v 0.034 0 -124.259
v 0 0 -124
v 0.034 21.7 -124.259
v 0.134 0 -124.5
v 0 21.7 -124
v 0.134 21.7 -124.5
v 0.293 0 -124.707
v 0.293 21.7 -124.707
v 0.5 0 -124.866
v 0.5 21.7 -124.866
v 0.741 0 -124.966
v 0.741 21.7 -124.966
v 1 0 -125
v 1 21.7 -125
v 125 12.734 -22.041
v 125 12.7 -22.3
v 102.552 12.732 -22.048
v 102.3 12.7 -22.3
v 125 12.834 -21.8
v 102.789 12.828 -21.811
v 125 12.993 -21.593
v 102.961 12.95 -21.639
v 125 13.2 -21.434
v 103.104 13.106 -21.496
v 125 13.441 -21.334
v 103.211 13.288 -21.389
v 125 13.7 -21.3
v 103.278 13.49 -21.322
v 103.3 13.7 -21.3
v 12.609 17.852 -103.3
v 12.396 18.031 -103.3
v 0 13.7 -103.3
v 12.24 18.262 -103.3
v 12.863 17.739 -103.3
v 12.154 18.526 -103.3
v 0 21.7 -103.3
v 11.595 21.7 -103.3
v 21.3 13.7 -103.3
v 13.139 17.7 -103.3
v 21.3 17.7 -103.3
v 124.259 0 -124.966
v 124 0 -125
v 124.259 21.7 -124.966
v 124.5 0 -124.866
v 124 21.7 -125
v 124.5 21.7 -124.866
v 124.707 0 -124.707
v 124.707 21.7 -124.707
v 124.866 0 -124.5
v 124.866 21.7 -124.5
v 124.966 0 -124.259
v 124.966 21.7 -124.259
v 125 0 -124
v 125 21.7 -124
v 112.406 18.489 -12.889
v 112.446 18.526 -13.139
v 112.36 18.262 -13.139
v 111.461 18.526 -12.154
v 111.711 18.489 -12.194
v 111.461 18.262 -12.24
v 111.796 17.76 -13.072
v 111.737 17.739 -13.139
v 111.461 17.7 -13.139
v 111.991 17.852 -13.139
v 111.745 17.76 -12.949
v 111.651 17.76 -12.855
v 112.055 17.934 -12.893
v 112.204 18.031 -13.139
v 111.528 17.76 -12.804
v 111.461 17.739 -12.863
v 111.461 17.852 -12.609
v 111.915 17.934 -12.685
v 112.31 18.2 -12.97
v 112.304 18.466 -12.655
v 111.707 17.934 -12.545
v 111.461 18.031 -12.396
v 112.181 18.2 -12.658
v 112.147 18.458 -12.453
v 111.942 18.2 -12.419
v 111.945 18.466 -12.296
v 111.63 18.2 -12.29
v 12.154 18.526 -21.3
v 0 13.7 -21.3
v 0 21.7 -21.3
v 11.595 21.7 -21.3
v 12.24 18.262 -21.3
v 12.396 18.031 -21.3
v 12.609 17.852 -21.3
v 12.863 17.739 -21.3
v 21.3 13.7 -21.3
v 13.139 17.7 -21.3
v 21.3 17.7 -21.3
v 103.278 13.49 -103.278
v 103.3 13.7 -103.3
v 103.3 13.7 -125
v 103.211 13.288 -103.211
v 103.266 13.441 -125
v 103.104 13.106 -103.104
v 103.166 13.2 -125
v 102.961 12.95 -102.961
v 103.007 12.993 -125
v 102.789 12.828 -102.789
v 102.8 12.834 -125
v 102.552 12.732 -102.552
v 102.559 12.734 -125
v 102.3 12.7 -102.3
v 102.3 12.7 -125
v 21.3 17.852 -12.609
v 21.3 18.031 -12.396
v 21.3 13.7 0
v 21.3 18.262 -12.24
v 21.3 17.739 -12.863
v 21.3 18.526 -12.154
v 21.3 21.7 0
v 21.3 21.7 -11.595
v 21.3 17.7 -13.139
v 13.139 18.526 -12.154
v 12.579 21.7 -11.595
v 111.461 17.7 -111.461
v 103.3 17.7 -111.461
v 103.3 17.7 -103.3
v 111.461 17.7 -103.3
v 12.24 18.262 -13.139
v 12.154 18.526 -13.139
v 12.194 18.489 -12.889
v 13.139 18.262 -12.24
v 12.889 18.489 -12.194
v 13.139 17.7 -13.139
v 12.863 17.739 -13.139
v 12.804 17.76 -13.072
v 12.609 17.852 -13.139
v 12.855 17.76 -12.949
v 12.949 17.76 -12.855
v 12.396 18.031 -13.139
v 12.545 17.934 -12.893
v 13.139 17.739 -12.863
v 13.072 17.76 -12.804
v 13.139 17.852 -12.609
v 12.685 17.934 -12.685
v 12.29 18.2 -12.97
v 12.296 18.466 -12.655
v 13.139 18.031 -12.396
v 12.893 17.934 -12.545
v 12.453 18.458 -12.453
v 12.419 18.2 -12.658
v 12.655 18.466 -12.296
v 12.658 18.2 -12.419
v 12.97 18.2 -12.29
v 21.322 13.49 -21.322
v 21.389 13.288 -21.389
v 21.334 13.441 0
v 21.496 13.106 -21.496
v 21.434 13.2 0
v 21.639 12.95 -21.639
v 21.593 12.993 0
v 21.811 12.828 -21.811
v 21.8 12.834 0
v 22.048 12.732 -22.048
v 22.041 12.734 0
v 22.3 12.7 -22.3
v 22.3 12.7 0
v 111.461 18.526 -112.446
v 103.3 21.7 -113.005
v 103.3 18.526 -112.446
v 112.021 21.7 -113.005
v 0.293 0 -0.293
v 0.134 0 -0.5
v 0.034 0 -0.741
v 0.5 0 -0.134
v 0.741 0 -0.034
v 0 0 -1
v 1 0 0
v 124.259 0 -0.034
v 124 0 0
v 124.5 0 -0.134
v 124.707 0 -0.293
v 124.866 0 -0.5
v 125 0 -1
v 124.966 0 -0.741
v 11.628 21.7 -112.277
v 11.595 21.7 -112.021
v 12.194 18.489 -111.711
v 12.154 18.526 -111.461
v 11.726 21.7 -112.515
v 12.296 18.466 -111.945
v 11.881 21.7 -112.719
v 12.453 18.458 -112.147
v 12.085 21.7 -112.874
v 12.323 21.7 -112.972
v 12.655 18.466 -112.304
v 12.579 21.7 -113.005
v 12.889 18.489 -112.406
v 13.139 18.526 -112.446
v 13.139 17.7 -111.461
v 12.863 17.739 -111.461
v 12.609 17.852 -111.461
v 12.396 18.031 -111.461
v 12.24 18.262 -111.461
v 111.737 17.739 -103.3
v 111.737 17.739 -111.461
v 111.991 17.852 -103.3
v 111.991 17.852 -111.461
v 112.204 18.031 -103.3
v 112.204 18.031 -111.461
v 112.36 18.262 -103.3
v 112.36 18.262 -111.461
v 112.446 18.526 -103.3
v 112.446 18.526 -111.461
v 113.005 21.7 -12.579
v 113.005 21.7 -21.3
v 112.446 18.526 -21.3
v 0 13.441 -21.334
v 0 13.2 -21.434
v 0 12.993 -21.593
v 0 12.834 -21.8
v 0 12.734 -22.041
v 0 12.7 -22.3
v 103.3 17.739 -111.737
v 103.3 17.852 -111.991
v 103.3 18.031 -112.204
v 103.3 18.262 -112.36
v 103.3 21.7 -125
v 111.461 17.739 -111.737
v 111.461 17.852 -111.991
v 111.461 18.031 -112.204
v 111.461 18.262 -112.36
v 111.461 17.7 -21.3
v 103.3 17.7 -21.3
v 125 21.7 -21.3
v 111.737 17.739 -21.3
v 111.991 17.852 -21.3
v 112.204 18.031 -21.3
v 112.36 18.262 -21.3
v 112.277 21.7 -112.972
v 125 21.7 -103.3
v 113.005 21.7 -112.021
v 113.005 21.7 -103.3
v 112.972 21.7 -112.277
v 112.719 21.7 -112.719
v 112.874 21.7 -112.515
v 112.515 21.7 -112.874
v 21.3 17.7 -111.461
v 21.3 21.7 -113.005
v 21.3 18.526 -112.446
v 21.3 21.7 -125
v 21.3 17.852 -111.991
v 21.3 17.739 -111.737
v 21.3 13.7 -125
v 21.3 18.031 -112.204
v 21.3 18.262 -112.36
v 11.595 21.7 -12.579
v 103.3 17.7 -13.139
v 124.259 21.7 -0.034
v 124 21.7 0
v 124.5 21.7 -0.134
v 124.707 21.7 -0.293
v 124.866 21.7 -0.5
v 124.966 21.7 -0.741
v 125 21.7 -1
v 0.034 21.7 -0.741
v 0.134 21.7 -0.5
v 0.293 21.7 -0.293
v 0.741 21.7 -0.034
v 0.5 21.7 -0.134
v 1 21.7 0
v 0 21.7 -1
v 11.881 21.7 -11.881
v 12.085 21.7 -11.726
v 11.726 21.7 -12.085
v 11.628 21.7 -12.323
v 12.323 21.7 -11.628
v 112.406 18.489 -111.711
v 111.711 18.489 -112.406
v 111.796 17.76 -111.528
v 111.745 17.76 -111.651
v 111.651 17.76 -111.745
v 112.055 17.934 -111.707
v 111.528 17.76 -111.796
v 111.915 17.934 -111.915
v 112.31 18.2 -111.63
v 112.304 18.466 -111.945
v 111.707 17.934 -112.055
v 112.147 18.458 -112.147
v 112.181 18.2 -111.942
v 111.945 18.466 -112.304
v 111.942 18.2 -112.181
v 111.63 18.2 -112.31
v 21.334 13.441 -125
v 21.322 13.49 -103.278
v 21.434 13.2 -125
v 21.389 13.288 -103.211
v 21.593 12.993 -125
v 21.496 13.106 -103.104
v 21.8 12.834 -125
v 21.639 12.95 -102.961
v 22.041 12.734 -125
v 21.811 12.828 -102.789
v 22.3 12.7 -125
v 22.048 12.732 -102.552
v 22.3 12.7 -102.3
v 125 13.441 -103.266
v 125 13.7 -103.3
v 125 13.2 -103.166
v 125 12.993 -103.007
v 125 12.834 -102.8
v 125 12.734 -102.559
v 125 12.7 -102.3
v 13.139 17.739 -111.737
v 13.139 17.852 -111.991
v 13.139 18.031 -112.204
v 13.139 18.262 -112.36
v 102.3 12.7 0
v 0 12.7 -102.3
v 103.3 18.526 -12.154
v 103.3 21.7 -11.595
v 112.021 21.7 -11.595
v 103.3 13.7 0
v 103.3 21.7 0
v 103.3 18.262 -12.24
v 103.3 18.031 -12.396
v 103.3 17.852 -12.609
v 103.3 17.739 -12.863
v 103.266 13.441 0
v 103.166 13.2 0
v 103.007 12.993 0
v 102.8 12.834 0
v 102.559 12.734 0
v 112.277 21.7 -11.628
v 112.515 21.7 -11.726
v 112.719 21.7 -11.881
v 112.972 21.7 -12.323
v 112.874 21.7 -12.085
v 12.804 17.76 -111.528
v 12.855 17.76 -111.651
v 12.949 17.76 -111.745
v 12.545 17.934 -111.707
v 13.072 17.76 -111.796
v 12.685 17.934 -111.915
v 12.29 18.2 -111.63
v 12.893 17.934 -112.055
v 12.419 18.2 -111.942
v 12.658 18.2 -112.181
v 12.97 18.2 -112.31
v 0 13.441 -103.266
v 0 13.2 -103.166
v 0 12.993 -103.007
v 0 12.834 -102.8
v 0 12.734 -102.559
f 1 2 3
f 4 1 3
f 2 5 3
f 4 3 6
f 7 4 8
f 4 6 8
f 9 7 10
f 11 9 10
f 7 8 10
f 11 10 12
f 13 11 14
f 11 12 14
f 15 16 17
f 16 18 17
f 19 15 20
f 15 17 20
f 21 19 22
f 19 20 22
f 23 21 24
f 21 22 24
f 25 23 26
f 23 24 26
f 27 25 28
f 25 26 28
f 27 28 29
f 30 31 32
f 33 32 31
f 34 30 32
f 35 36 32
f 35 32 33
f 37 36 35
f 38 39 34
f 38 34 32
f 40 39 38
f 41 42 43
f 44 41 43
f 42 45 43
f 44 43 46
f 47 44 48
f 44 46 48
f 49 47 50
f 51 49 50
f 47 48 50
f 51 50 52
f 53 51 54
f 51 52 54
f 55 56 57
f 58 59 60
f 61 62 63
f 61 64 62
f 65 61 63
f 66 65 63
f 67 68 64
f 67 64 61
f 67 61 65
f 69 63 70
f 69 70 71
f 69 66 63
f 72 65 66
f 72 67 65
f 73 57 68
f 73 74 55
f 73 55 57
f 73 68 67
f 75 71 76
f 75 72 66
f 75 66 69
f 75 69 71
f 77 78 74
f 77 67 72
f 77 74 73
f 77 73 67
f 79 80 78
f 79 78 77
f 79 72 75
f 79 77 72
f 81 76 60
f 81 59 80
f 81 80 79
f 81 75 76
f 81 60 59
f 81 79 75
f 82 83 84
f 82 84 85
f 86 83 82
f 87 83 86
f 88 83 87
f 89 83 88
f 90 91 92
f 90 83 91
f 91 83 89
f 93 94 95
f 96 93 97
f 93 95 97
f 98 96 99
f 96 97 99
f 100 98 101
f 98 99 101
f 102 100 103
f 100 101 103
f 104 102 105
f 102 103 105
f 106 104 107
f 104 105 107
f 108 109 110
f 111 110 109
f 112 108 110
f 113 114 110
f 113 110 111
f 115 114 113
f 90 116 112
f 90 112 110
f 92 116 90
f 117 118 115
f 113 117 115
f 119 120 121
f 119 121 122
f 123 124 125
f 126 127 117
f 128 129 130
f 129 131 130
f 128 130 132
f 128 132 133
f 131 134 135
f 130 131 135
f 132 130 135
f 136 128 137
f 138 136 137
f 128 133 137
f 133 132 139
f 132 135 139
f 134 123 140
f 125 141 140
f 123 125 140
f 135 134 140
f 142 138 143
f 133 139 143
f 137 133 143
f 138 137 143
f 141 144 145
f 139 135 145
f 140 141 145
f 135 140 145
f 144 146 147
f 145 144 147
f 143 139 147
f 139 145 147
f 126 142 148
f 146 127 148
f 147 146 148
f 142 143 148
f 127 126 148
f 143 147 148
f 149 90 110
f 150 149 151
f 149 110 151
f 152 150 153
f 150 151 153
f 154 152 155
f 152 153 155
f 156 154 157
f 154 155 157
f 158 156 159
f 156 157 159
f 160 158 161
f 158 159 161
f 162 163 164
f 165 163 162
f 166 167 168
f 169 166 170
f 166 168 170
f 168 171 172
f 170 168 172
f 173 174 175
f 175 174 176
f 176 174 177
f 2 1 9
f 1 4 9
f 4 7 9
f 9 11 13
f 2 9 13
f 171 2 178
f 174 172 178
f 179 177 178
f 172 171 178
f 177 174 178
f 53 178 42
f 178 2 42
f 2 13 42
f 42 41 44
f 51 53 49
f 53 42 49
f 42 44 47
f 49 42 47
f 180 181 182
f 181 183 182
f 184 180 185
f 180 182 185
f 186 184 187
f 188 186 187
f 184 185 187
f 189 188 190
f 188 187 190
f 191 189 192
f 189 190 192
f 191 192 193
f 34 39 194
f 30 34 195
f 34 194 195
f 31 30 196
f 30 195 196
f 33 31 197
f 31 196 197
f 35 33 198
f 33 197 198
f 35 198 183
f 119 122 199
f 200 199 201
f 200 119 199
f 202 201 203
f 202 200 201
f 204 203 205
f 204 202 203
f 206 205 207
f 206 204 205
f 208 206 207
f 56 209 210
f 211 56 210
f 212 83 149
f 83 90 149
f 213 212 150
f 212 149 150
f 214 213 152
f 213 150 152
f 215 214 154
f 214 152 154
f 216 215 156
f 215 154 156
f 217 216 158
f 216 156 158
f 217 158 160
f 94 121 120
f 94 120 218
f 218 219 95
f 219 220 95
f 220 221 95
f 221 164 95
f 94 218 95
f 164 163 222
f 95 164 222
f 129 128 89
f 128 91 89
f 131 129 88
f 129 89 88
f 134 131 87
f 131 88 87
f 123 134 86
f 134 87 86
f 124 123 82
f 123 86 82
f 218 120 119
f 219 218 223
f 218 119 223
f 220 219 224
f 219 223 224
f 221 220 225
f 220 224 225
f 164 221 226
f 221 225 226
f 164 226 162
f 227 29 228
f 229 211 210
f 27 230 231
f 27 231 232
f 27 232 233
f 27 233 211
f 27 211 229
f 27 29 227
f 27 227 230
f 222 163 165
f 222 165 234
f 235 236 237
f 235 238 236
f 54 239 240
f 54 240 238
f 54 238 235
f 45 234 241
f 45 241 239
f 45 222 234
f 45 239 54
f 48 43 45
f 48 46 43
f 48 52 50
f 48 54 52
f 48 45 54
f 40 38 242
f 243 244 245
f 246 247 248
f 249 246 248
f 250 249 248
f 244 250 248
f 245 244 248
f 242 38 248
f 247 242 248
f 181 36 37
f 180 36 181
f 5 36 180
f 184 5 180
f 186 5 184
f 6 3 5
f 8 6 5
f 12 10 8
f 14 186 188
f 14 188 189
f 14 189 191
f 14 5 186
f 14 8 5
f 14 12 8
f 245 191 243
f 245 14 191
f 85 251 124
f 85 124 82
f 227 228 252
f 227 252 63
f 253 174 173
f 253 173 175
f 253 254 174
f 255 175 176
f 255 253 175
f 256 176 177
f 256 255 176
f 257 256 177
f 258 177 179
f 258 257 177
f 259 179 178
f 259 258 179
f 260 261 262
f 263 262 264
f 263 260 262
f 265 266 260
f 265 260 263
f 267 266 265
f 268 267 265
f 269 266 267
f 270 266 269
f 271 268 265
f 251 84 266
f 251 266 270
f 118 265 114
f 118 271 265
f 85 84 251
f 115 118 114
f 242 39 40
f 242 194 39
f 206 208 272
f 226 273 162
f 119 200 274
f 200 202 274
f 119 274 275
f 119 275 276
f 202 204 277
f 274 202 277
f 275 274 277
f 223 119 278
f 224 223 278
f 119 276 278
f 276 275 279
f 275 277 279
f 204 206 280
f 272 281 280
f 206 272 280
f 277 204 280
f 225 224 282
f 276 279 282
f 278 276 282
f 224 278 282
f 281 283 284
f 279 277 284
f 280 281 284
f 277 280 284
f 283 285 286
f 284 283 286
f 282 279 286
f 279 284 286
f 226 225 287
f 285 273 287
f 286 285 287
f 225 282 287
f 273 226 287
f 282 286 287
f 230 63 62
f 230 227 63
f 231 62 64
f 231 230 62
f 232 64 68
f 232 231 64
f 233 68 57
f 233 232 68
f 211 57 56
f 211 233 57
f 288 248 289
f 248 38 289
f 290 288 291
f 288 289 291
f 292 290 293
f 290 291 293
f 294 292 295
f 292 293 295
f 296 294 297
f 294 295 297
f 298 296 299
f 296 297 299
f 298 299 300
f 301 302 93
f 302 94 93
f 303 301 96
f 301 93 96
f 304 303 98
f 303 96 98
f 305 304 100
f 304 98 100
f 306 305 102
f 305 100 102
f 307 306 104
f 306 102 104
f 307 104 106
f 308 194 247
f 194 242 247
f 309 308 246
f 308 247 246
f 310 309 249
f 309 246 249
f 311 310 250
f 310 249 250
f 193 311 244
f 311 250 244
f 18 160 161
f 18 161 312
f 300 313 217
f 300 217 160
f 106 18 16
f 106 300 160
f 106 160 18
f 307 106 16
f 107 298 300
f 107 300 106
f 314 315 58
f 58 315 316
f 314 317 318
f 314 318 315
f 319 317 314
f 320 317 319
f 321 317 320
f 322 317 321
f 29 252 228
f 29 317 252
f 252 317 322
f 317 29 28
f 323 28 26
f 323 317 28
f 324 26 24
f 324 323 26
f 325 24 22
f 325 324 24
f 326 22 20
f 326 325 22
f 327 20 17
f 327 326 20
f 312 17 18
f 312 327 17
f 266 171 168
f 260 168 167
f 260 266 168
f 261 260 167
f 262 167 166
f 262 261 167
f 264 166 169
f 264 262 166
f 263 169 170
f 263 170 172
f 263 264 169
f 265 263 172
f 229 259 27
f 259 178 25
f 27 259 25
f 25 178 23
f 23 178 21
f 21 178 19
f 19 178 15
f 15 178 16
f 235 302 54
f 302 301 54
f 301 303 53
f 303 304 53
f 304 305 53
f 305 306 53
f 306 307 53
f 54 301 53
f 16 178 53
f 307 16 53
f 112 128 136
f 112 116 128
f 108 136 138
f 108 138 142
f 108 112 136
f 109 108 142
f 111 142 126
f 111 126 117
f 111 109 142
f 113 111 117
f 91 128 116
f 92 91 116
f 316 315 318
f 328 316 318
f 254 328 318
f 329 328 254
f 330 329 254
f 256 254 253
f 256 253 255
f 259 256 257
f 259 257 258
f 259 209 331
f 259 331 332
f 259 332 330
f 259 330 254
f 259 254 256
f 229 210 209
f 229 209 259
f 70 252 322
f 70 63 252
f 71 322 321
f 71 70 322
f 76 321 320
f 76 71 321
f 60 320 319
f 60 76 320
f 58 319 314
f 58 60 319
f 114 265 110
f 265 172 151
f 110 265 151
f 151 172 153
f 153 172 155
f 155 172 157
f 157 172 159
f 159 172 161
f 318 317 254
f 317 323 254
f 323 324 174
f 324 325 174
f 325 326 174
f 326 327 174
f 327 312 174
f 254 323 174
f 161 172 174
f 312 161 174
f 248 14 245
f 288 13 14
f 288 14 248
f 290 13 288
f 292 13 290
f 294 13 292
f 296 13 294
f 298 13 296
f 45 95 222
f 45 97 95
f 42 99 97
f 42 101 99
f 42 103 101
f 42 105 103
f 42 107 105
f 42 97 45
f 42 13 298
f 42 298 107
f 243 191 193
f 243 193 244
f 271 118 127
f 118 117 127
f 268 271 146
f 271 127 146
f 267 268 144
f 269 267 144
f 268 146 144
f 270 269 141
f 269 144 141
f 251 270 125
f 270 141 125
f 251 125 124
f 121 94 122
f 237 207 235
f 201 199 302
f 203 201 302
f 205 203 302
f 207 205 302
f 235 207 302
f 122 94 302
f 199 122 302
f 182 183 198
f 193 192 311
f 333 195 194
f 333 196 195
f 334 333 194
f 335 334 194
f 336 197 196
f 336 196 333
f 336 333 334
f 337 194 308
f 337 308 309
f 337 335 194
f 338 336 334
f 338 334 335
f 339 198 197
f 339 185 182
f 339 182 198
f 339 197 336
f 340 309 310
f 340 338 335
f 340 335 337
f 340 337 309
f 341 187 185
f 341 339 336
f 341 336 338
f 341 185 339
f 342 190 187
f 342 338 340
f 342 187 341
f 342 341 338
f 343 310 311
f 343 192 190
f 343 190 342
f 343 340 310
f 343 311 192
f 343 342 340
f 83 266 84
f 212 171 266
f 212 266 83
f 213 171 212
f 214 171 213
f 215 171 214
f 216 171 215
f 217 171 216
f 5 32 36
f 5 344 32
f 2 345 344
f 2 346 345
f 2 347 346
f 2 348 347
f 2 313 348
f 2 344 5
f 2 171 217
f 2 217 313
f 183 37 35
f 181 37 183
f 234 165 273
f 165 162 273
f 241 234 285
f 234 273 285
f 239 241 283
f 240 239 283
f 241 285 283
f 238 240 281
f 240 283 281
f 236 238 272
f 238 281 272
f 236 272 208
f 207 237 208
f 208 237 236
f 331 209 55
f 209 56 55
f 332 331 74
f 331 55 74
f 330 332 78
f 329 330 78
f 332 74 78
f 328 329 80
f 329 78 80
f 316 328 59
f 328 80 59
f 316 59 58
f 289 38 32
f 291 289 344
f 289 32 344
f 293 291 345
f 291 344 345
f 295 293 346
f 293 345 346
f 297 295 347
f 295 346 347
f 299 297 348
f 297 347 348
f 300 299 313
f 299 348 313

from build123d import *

# Parameters (mm, degrees)
SKETCH1_W           = 125
SKETCH1_H           = 125
BOSS_EXTRUDE1_DEPTH = 21.7
SKETCH2_W           = 100
SKETCH2_H           = 100
CUT_EXTRUDE1_DEPTH  = 9
FILLET2_R           = 1
SKETCH4_W           = 82
SKETCH4_H           = 12.7
SKETCH4_W_2         = 12.3
SKETCH4_H_2         = 82
SKETCH4_H_3         = 12.3
SKETCH4_W_3         = 12.7
CUT_EXTRUDE2_DEPTH  = 9
SKETCH5_W           = 9
SKETCH5_H           = 9
BOSS_EXTRUDE2_DEPTH = 5
DRAFT1_ANGLE        = 10
DRAFT2_ANGLE        = 10
DRAFT3_ANGLE        = 10
DRAFT4_ANGLE        = 10
FILLET3_R           = 1


with BuildPart() as part:
    # Sketch1 → Boss-Extrude1 (new body)
    with BuildSketch(Plane(origin=(0, 0, 0), x_dir=(1, 0, 0), z_dir=(0, 1, 0))):
        with Locations((62.5, 62.5)):
            Rectangle(SKETCH1_W, SKETCH1_H)
    extrude(amount=BOSS_EXTRUDE1_DEPTH)

    # Sketch2 → Cut-Extrude1 (cut)
    with BuildSketch(Plane(origin=(0, 21.7, 0), x_dir=(1, 0, 0), z_dir=(0, 1, 0))):
        with Locations((62.3, 62.3)):
            Rectangle(SKETCH2_W, SKETCH2_H)
    extrude(amount=-CUT_EXTRUDE1_DEPTH, mode=Mode.SUBTRACT)

    # Fillet2
    fillet2_edges = [part.edges().sort_by_distance(p)[0] for p in [
        (0, 10.85, -125),
        (125, 10.85, -125),
        (125, 10.85, 0),
        (0, 10.85, 0),
    ]]
    fillet(fillet2_edges, radius=FILLET2_R)

    # Sketch4 → Cut-Extrude2 (cut)
    with BuildSketch(Plane(origin=(0, 21.7, 0), x_dir=(1, 0, 0), z_dir=(0, 1, 0))):
        with Locations((62.3, 118.65)):
            Rectangle(SKETCH4_W, SKETCH4_H)
        with Locations((6.15, 62.3)):
            Rectangle(SKETCH4_W_2, SKETCH4_H_2)
        with Locations((62.3, 6.15)):
            Rectangle(SKETCH4_W, SKETCH4_H_3)
        with Locations((118.65, 62.3)):
            Rectangle(SKETCH4_W_3, SKETCH4_H_2)
    extrude(amount=-CUT_EXTRUDE2_DEPTH, mode=Mode.SUBTRACT)

    # Sketch5 → Boss-Extrude2 (add)
    with BuildSketch(Plane(origin=(0, 12.7, 0), x_dir=(1, 0, 0), z_dir=(0, 1, 0))):
        with Locations((107.8, 16.8)):
            Rectangle(SKETCH5_W, SKETCH5_H)
        with Locations((16.8, 16.8)):
            Rectangle(SKETCH5_W, SKETCH5_H)
        with Locations((16.8, 107.8)):
            Rectangle(SKETCH5_W, SKETCH5_H)
        with Locations((107.8, 107.8)):
            Rectangle(SKETCH5_W, SKETCH5_H)
    extrude(amount=BOSS_EXTRUDE2_DEPTH)

    # Draft1
    draft1_faces = [part.faces().sort_by_distance(p)[0] for p in [
        (112.3, 19.7, -16.8),
        (107.8, 19.7, -12.3),
    ]]
    draft(draft1_faces, Plane.ZX.offset(17.7), DRAFT1_ANGLE)

    # Draft2
    draft2_faces = [part.faces().sort_by_distance(p)[0] for p in [
        (12.3, 19.7, -16.8),
        (16.8, 19.7, -12.3),
    ]]
    draft(draft2_faces, Plane.ZX.offset(17.7), DRAFT2_ANGLE)

    # Draft3
    draft3_faces = [part.faces().sort_by_distance(p)[0] for p in [
        (16.8, 19.7, -112.3),
        (12.3, 19.7, -107.8),
    ]]
    draft(draft3_faces, Plane.ZX.offset(17.7), DRAFT3_ANGLE)

    # Draft4
    draft4_faces = [part.faces().sort_by_distance(p)[0] for p in [
        (112.3, 19.7, -107.8),
        (107.8, 19.7, -112.3),
    ]]
    draft(draft4_faces, Plane.ZX.offset(17.7), DRAFT4_ANGLE)

    # Fillet3
    fillet3_edges = [part.edges().sort_by_distance(p)[0] for p in [
        (112.652653961, 19.7, -11.947346039),
        (112.3, 17.7, -16.8),
        (107.8, 17.7, -12.3),
        (11.947346039, 19.7, -11.947346039),
        (12.3, 17.7, -16.8),
        (16.8, 17.7, -12.3),
        (11.947346039, 19.7, -112.652653961),
        (12.3, 17.7, -107.8),
        (16.8, 17.7, -112.3),
        (112.652653961, 19.7, -112.652653961),
        (112.3, 17.7, -107.8),
        (107.8, 17.7, -112.3),
        (103.3, 12.7, -114.15),
        (21.3, 12.7, -114.15),
        (10.65, 12.7, -21.3),
        (10.65, 12.7, -103.3),
        (103.3, 12.7, -10.65),
        (21.3, 12.7, -10.65),
        (114.15, 12.7, -21.3),
        (114.15, 12.7, -103.3),
    ]]
    fillet(fillet3_edges, radius=FILLET3_R)


solid = part.part
